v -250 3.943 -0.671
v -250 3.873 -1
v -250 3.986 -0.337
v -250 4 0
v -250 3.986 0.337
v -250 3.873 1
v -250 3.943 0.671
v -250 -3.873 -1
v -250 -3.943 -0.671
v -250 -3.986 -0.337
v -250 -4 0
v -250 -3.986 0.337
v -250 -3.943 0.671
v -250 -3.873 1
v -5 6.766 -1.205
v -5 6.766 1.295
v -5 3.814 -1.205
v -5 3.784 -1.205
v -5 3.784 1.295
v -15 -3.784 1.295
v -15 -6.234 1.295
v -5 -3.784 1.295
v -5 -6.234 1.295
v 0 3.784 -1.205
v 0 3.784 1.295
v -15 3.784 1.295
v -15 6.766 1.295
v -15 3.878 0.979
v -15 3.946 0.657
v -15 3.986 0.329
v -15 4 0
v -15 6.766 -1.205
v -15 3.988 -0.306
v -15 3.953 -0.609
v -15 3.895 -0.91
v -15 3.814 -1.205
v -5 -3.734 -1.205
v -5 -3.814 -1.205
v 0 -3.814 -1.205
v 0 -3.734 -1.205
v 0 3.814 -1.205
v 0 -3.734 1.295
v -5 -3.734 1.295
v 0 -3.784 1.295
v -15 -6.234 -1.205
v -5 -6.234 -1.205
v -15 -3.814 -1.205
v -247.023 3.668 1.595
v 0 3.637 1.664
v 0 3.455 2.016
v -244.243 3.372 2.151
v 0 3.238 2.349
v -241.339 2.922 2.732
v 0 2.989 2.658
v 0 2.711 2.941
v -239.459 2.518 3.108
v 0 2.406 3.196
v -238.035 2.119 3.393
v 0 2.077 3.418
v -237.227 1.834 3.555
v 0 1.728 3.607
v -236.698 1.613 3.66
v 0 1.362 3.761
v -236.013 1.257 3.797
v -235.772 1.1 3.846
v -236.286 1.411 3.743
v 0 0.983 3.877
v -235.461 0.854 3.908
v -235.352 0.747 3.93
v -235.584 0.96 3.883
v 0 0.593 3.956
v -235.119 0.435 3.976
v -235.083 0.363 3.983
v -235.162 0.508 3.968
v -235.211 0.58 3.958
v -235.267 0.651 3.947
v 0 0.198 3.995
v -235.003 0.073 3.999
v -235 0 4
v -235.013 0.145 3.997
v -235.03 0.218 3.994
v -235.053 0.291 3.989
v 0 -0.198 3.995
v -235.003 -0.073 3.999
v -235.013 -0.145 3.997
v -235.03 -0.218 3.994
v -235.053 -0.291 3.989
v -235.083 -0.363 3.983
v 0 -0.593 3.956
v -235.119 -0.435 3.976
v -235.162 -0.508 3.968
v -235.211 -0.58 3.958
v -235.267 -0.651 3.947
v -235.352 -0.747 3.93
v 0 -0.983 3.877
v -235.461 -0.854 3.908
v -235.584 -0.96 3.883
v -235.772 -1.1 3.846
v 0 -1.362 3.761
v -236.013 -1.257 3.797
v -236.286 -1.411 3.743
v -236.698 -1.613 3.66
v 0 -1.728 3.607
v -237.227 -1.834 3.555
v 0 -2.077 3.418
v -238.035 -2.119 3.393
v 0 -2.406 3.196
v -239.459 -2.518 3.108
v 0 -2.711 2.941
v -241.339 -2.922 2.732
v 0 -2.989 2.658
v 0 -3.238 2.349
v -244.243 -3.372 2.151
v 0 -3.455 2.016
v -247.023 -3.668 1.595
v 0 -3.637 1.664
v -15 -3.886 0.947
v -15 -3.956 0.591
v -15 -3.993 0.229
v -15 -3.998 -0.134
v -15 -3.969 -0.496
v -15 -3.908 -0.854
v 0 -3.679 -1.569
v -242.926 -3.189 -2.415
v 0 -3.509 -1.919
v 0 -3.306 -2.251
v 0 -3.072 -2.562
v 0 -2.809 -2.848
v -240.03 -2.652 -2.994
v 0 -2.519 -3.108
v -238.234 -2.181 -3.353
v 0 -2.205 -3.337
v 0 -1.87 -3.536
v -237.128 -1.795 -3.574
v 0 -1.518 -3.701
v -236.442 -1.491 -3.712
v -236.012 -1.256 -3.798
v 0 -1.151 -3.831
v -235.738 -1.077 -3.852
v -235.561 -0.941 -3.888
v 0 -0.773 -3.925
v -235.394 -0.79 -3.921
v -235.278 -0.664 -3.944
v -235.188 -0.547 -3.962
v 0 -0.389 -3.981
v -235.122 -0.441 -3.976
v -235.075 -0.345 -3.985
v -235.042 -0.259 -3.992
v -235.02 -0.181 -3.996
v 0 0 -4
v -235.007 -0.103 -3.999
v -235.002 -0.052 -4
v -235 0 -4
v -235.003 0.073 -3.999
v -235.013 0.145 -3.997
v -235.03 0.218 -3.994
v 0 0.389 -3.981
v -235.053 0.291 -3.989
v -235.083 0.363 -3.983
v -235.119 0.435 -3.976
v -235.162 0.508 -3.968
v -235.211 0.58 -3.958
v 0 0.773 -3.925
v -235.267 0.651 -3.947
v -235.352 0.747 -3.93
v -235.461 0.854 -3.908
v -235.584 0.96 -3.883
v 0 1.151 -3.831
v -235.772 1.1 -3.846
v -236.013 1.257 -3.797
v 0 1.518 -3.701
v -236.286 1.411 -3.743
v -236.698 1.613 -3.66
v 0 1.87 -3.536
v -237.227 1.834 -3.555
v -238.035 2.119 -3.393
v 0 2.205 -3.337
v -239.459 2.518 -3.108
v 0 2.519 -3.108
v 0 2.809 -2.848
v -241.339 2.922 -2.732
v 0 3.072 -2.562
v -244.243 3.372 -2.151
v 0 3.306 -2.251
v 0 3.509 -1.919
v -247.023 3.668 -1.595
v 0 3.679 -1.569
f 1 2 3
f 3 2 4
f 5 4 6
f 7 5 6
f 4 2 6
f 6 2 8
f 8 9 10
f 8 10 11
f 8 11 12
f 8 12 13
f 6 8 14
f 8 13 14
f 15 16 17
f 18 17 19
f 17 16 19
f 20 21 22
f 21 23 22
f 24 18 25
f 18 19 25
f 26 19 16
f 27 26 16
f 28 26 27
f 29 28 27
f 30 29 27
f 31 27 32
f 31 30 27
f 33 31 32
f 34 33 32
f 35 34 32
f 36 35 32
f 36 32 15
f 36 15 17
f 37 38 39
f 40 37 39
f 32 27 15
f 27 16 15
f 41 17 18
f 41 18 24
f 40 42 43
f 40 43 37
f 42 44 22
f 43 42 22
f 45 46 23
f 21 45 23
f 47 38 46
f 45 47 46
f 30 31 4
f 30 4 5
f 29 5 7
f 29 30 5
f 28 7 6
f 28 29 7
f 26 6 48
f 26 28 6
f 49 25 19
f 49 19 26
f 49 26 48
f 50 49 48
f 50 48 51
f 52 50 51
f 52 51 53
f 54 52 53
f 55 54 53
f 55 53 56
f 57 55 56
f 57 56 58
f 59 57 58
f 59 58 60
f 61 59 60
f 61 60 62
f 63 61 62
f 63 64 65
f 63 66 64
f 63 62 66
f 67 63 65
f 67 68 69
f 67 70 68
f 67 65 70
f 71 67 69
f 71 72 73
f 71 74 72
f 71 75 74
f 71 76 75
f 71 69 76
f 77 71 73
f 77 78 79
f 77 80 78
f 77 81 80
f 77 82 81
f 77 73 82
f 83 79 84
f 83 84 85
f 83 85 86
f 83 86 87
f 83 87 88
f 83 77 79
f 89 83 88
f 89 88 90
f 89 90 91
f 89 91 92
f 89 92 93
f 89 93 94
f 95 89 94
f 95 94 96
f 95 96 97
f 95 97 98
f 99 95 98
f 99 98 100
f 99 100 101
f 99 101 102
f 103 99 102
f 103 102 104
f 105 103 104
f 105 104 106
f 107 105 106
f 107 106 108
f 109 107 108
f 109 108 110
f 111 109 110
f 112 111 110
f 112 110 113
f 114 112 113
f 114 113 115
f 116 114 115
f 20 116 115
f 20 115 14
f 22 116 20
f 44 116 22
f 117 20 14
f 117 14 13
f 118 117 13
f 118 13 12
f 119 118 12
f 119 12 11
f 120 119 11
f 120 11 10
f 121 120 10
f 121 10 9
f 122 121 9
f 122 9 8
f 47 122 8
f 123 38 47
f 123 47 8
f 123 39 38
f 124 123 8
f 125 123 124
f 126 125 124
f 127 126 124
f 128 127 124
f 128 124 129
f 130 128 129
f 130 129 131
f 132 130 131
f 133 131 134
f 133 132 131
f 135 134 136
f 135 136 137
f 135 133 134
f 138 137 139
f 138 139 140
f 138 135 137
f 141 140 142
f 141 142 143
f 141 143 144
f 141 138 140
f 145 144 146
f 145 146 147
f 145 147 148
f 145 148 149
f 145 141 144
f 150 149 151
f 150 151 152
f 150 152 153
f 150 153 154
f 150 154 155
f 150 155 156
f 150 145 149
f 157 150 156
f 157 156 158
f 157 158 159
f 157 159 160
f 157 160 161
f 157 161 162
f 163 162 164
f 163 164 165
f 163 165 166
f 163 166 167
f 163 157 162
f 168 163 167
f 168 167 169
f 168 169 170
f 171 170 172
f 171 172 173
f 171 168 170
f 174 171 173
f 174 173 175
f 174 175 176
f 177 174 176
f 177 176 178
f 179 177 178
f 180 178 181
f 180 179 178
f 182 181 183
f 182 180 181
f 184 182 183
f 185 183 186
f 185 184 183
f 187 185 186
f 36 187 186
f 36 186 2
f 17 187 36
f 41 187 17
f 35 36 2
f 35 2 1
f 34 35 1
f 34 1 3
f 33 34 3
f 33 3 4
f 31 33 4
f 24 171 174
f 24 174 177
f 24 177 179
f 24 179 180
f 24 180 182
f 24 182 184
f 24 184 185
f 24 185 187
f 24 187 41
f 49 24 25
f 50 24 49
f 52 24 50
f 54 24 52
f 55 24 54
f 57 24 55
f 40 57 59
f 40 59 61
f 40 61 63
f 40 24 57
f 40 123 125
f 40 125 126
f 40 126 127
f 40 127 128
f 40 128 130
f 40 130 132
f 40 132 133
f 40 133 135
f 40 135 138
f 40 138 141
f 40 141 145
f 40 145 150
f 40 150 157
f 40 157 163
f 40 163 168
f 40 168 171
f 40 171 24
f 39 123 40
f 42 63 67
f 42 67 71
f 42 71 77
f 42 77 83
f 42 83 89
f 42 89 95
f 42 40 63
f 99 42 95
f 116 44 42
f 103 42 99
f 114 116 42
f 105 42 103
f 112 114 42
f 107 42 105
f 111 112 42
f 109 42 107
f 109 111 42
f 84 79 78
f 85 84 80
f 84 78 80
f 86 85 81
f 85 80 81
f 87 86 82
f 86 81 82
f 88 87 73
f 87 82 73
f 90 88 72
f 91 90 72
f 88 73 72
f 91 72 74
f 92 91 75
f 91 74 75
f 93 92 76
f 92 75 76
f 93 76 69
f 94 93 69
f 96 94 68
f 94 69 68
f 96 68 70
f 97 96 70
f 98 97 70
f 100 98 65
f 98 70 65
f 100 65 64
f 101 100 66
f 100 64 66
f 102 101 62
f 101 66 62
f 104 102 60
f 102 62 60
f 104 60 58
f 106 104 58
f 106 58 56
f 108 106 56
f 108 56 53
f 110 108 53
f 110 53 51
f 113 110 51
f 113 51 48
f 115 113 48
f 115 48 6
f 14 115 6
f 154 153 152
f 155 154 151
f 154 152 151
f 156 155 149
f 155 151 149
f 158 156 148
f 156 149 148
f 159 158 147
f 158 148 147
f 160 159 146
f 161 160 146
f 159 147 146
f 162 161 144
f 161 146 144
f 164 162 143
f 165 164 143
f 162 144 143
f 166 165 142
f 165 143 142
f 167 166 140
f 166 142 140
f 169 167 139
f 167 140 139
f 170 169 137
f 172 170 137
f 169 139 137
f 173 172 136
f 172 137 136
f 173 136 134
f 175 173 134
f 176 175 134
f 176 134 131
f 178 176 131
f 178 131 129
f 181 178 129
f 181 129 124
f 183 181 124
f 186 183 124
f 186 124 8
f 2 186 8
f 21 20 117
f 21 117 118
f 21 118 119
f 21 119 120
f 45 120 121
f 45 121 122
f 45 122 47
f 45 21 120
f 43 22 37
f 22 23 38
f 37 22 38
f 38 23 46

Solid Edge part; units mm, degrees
sketch "Sketch1" plane through (0, 0, 0) normal (1, 0, 0) x (0, 1, 0)
  circle A0 centre (0, 0) radius 4
  dimension "D1" = 8
extrude "Protrusion1" add sketch "Sketch1" against normal blind 250
sketch "Sketch2" plane through (0, 0, 0) normal (1, 0, 0) x (0, 1, 0)
  line L0 (-6.0933, 1.2954) -> (6.7659, 1.2954)
  line L1 (6.7659, 1.2954) -> (6.7659, -1.2046)
  line L2 (6.7659, -1.2046) -> (-6.2341, -1.2046)
  line L3 (-6.2341, -1.2046) -> (-6.2341, 1.2954)
  line L4 (-6.2341, 1.2954) -> (-6.0933, 1.2954)
  dimension "D1" = 13
  dimension "D2" = 2.5
extrude "拉伸_6" add sketch "Sketch2" against normal blind 15
sketch "Sketch3" plane through (-7.5, -6.2341, 0.0454) normal (0, -1, 0) x (1, 0, 0)
  line L0 (7.5, 1.25) -> (2.5, 1.25)
  line L1 (2.5, 1.25) -> (2.5, -1.25)
  line L2 (2.5, -1.25) -> (7.5, -1.25)
  line L3 (7.5, -1.25) -> (7.5, 1.25)
  dimension "D1" = 5
extrude "拉伸除料_1" cut sketch "Sketch3" against normal blind 2.5
sketch "Sketch4" plane through (-7.5, 5.2752, 1.2954) normal (0, 0, 1) x (1, 0, 0)
  line L0 (7.5, 1.4908) -> (2.5, 1.4908)
  line L1 (2.5, 1.4908) -> (2.5, -1.4908)
  line L2 (2.5, -1.4908) -> (7.5, -1.4908)
  line L3 (7.5, -1.4908) -> (7.5, 1.4908)
  dimension "D1" = 5
extrude "Cutout1" cut sketch "Sketch4" against normal blind 2.5
sketch "Sketch5" plane through (0, 0, 0) normal (0, -1, 0) x (1, 0, 0)
  line L0 (-250, 4) -> (-235, 4)
  line L1 (-235, 4) -> (-250, 1)
  line L2 (-250, 1) -> (-250, 4)
  dimension "D1" = 3
  dimension "D2" = 15
extrude "Cutout2" cut sketch "Sketch5" against normal blind 21.4935
sketch "Sketch6" plane through (0, 0, 0) normal (0, -1, 0) x (1, 0, 0)
  line L0 (-250, 4) -> (-235, 4)
  line L1 (-235, 4) -> (-250, 1)
  line L2 (-250, 1) -> (-250, 4)
  dimension "D1" = 3
  dimension "D2" = 15
extrude "拉伸除料_4" cut sketch "Sketch6" along normal blind 51.5804
sketch "Sketch7" plane through (0, 0, 0) normal (0, -1, 0) x (1, 0, 0)
  line L0 (-250, -4) -> (-250, -1)
  line L1 (-250, -1) -> (-235, -4)
  line L2 (-235, -4) -> (-250, -4)
  dimension "D1" = 3
  dimension "D2" = 15
extrude "拉伸除料_5" cut sketch "Sketch7" along normal blind 13.6842
sketch "Sketch8" plane through (-242.5, 0, -2.5) normal (0, -1, 0) x (1, 0, 0)
  line L0 (-7.5, 1.5) -> (-7.5, -1.5)
  line L1 (-7.5, -1.5) -> (7.5, -1.5)
  line L2 (7.5, -1.5) -> (-7.5, 1.5)
extrude "Cutout3" cut sketch "Sketch8" against normal blind 26.2163
properties material "不锈钢 303"
